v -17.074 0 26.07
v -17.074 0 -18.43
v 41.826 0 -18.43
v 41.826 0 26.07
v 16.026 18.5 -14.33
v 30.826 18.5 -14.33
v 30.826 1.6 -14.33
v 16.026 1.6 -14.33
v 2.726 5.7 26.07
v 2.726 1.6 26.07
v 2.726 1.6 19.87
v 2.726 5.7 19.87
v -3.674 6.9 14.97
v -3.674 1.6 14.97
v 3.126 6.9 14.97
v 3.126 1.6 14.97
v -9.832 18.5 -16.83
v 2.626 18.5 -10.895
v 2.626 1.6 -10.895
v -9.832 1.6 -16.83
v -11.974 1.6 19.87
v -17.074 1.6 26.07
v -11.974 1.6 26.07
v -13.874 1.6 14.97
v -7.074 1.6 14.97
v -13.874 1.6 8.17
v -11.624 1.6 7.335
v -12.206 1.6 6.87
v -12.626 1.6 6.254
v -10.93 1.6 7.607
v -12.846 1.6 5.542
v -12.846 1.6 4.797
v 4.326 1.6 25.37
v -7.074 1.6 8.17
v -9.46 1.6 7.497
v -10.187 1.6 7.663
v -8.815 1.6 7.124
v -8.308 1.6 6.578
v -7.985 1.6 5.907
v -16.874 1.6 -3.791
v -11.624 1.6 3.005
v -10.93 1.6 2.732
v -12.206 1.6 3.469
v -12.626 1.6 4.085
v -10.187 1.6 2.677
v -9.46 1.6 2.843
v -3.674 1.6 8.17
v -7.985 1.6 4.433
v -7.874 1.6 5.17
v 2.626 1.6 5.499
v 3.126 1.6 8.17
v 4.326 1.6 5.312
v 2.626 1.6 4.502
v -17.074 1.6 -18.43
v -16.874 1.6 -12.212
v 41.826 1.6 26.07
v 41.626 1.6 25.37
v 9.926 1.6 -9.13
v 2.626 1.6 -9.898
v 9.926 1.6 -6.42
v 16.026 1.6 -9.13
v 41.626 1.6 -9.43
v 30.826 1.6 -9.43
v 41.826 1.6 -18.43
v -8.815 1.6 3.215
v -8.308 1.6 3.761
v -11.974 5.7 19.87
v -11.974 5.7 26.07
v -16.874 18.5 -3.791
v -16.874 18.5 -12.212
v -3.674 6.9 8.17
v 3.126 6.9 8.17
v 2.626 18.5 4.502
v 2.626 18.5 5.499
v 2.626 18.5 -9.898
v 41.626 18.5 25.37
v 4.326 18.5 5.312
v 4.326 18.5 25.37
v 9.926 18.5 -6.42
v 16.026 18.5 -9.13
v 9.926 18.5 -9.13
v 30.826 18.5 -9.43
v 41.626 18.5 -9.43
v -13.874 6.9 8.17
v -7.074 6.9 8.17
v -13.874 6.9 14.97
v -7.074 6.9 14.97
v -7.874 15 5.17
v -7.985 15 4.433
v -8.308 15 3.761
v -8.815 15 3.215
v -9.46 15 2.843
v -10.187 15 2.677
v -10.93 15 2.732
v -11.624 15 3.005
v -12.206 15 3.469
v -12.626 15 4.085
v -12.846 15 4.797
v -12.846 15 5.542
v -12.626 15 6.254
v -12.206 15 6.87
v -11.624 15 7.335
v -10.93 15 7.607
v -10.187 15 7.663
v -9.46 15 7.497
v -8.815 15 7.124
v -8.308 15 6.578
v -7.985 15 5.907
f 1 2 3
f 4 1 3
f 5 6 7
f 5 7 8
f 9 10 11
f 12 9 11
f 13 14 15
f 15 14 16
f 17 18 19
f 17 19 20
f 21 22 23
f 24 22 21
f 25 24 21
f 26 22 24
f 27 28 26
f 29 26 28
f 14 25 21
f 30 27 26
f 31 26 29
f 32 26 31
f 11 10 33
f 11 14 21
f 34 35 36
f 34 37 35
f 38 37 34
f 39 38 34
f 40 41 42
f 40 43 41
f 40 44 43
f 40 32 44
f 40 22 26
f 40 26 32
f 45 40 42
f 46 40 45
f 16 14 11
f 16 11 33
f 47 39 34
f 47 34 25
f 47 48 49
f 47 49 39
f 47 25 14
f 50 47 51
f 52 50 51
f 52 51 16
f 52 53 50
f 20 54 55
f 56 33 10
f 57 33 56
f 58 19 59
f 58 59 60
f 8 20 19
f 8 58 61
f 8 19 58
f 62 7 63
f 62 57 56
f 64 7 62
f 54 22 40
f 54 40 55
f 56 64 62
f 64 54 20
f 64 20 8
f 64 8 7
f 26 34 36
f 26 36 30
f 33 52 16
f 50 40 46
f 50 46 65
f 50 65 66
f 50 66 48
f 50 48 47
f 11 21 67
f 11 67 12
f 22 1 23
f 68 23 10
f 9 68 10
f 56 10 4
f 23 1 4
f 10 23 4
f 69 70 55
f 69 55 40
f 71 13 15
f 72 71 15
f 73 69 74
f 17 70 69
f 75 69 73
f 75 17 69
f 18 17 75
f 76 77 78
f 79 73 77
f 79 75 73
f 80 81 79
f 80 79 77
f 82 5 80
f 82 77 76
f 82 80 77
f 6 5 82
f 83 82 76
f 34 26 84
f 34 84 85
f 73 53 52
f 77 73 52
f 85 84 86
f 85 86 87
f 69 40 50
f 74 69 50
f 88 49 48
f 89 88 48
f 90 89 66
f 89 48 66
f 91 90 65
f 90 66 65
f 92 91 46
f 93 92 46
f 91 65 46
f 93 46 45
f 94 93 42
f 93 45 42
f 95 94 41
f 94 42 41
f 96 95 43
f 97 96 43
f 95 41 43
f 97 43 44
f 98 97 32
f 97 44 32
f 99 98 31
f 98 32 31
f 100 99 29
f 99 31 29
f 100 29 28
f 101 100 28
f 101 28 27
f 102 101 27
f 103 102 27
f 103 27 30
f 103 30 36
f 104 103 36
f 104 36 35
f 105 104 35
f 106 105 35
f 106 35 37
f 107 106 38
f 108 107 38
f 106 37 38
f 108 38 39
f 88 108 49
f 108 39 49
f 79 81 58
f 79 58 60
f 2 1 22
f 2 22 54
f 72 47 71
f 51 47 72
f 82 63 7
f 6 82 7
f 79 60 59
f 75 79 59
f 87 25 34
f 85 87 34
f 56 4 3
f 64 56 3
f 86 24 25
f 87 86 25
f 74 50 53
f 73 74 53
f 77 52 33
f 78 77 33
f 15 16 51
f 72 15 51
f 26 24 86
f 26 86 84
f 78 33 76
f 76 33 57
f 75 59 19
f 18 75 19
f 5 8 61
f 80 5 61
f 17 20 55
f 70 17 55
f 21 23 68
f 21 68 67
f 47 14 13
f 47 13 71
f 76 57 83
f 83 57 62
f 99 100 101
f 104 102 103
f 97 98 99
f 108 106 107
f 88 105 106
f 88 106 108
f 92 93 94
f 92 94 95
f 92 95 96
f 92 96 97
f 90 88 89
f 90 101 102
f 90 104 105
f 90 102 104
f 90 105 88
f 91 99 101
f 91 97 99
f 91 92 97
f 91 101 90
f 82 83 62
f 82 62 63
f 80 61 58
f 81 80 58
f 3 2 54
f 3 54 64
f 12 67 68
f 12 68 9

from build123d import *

# Parameters (mm, degrees)
SKETCH1_W           = 58.9
SKETCH1_H           = 44.5
BOSS_EXTRUDE1_DEPTH = 1.6
BOSS_EXTRUDE2_DEPTH = 16.9
SKETCH3_W           = 14.7
SKETCH3_H           = 6.2
BOSS_EXTRUDE3_DEPTH = 4.1
SKETCH3_3_W         = 6.8
SKETCH3_3_H         = 6.8
BOSS_EXTRUDE4_DEPTH = 5.3
SKETCH3_4_R         = 2.5
BOSS_EXTRUDE5_DEPTH = 13.4


with BuildPart() as part:
    # Sketch1 → Boss-Extrude1 (new body)
    with BuildSketch(Plane(origin=(0, 0, 0), x_dir=(1, 0, 0), z_dir=(0, 1, 0))):
        with Locations((12.376180258, -3.819742489)):
            Rectangle(SKETCH1_W, SKETCH1_H)
    extrude(amount=BOSS_EXTRUDE1_DEPTH)

    # Sketch2 → Boss-Extrude2 (add)
    with BuildSketch(Plane(origin=(0, 1.6, 0), x_dir=(1, 0, 0), z_dir=(0, 1, 0))):
        Polygon((-16.873819742, 12.212165342), (-16.873819742, 3.791248246), (2.626180258, -5.499069294), (2.626180258, -4.502146217), (4.326180258, -5.312071336), (4.326180258, -25.369742489), (41.626180258, -25.369742489), (41.626180258, 9.430257511), (30.826180258, 9.430257511), (30.826180258, 14.330257511), (16.026180258, 14.330257511), (16.026180258, 9.130257511), (9.926180258, 9.130257511), (9.926180258, 6.419940037), (2.626180258, 9.897853783), (2.626180258, 10.89477686), (-9.832153076, 16.830257511), align=None)
    extrude(amount=BOSS_EXTRUDE2_DEPTH)

    # Sketch3 → Boss-Extrude3 (add)
    with BuildSketch(Plane(origin=(0, 1.6, 0), x_dir=(1, 0, 0), z_dir=(0, 1, 0))):
        with Locations((-4.623819742, -22.969742489)):
            Rectangle(SKETCH3_W, SKETCH3_H)
    extrude(amount=BOSS_EXTRUDE3_DEPTH)

    # Sketch3<3> → Boss-Extrude4 (add)
    with BuildSketch(Plane(origin=(0, 1.6, 0), x_dir=(1, 0, 0), z_dir=(0, 1, 0))):
        with Locations((-10.473819742, -11.569742489)):
            Rectangle(SKETCH3_3_W, SKETCH3_3_H)
        with Locations((-0.273819742, -11.569742489)):
            Rectangle(SKETCH3_3_W, SKETCH3_3_H)
    extrude(amount=BOSS_EXTRUDE4_DEPTH)

    # Sketch3<4> → Boss-Extrude5 (add)
    with BuildSketch(Plane(origin=(0, 1.6, 0), x_dir=(1, 0, 0), z_dir=(0, 1, 0))):
        with Locations((-10.373819742, -5.169742489)):
            Circle(SKETCH3_4_R)
    extrude(amount=BOSS_EXTRUDE5_DEPTH)


solid = part.part
